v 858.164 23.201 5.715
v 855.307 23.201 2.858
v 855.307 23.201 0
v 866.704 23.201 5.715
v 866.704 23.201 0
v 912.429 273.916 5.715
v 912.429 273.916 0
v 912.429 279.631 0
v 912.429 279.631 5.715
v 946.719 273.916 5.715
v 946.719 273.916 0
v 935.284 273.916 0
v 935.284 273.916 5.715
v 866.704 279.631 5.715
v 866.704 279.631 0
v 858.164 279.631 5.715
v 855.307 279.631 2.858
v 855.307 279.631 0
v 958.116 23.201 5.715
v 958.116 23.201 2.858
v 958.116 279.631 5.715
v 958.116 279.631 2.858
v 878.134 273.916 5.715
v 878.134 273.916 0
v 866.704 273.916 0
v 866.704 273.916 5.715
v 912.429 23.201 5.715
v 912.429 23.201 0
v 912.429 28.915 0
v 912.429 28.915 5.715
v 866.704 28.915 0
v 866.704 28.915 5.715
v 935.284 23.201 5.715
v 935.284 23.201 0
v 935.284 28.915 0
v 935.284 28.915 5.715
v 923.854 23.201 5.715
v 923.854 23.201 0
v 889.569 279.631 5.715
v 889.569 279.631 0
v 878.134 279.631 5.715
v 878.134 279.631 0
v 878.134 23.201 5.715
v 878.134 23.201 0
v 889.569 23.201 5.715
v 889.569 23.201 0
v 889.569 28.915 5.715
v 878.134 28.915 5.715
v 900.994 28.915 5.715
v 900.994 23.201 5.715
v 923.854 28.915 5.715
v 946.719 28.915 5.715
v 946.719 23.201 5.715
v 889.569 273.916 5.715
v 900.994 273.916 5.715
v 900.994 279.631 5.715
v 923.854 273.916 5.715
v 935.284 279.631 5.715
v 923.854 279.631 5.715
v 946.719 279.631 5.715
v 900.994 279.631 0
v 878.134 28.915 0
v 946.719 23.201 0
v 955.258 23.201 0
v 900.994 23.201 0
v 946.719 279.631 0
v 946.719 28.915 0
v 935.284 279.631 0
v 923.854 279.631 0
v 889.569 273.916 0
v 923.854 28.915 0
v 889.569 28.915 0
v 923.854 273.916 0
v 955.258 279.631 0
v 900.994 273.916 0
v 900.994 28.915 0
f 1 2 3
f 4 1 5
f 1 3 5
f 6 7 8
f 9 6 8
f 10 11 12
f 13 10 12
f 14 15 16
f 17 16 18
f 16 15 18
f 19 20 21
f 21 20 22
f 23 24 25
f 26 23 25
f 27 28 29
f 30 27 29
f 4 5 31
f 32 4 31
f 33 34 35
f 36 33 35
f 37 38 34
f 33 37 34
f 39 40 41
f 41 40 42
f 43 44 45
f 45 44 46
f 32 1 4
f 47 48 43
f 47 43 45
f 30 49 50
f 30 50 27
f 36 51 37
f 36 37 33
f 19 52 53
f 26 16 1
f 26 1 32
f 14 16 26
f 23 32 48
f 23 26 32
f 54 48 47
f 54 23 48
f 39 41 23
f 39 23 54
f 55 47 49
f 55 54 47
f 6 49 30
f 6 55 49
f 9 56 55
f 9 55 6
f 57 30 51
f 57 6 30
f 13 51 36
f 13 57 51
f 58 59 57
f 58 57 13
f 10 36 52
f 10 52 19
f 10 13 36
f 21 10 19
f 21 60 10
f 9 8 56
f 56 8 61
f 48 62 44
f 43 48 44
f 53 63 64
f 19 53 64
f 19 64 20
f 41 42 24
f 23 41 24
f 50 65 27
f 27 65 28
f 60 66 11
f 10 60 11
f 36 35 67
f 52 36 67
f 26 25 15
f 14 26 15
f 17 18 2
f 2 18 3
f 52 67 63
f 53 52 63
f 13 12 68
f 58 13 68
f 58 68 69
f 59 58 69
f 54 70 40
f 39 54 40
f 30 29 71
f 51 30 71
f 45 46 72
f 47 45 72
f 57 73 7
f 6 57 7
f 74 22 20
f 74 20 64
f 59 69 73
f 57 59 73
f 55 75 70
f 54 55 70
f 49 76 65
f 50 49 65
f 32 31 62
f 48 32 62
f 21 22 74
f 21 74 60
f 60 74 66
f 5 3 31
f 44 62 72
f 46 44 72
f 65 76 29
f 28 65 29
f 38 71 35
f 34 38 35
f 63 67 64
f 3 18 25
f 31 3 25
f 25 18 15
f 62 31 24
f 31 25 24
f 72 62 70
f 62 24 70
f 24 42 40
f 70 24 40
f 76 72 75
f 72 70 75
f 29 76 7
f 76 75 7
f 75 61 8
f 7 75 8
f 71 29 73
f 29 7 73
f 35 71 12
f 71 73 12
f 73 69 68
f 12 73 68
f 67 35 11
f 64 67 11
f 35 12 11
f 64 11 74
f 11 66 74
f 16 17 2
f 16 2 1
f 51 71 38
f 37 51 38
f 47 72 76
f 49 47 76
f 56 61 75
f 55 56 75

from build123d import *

# Parameters (mm, degrees)
BOSS_EXTRUDE1_DEPTH = 5.715
CUT_EXTRUDE1_DEPTH  = 257.4305006


with BuildPart() as part:
    # Model → Boss-Extrude1 (new body)
    with BuildSketch(Plane.XY):
        Polygon((861.0219, 23.2006394), (866.70388, 23.2006394), (866.70388, 28.91536), (878.13388, 28.91536), (878.13388, 23.2006394), (889.56896, 23.2006394), (889.56896, 28.91536), (900.99388, 28.91536), (900.99388, 23.2006394), (912.42896, 23.2006394), (912.42896, 28.91536), (923.85388, 28.91536), (923.85388, 23.2006394), (935.28388, 23.2006394), (935.28388, 28.91536), (946.71896, 28.91536), (946.71896, 23.2006394), (958.11594, 23.2006394), (958.11594, 279.63114), (946.71896, 279.63114), (946.71896, 273.91614), (935.28388, 273.91614), (935.28388, 279.63114), (923.85388, 279.63114), (923.85388, 273.91614), (912.42896, 273.91614), (912.42896, 279.63114), (900.99388, 279.63114), (900.99388, 273.91614), (889.56896, 273.91614), (889.56896, 279.63114), (878.13388, 279.63114), (878.13388, 273.91614), (866.70388, 273.91614), (866.70388, 279.63114), (855.3069, 279.63114), (855.3069, 23.2006394), align=None)
    extrude(amount=BOSS_EXTRUDE1_DEPTH)

    # Sketch1 → Cut-Extrude1 (cut, through all)
    with BuildSketch(Plane.XZ.offset(-23.2006394)):
        Polygon((855.3069, 2.8575), (858.1644, 5.715), (855.3069, 5.715), align=None)
        Polygon((958.11594, 2.8575), (955.25844, 0), (958.11594, 0), align=None)
    extrude(amount=-CUT_EXTRUDE1_DEPTH, mode=Mode.SUBTRACT)


solid = part.part
